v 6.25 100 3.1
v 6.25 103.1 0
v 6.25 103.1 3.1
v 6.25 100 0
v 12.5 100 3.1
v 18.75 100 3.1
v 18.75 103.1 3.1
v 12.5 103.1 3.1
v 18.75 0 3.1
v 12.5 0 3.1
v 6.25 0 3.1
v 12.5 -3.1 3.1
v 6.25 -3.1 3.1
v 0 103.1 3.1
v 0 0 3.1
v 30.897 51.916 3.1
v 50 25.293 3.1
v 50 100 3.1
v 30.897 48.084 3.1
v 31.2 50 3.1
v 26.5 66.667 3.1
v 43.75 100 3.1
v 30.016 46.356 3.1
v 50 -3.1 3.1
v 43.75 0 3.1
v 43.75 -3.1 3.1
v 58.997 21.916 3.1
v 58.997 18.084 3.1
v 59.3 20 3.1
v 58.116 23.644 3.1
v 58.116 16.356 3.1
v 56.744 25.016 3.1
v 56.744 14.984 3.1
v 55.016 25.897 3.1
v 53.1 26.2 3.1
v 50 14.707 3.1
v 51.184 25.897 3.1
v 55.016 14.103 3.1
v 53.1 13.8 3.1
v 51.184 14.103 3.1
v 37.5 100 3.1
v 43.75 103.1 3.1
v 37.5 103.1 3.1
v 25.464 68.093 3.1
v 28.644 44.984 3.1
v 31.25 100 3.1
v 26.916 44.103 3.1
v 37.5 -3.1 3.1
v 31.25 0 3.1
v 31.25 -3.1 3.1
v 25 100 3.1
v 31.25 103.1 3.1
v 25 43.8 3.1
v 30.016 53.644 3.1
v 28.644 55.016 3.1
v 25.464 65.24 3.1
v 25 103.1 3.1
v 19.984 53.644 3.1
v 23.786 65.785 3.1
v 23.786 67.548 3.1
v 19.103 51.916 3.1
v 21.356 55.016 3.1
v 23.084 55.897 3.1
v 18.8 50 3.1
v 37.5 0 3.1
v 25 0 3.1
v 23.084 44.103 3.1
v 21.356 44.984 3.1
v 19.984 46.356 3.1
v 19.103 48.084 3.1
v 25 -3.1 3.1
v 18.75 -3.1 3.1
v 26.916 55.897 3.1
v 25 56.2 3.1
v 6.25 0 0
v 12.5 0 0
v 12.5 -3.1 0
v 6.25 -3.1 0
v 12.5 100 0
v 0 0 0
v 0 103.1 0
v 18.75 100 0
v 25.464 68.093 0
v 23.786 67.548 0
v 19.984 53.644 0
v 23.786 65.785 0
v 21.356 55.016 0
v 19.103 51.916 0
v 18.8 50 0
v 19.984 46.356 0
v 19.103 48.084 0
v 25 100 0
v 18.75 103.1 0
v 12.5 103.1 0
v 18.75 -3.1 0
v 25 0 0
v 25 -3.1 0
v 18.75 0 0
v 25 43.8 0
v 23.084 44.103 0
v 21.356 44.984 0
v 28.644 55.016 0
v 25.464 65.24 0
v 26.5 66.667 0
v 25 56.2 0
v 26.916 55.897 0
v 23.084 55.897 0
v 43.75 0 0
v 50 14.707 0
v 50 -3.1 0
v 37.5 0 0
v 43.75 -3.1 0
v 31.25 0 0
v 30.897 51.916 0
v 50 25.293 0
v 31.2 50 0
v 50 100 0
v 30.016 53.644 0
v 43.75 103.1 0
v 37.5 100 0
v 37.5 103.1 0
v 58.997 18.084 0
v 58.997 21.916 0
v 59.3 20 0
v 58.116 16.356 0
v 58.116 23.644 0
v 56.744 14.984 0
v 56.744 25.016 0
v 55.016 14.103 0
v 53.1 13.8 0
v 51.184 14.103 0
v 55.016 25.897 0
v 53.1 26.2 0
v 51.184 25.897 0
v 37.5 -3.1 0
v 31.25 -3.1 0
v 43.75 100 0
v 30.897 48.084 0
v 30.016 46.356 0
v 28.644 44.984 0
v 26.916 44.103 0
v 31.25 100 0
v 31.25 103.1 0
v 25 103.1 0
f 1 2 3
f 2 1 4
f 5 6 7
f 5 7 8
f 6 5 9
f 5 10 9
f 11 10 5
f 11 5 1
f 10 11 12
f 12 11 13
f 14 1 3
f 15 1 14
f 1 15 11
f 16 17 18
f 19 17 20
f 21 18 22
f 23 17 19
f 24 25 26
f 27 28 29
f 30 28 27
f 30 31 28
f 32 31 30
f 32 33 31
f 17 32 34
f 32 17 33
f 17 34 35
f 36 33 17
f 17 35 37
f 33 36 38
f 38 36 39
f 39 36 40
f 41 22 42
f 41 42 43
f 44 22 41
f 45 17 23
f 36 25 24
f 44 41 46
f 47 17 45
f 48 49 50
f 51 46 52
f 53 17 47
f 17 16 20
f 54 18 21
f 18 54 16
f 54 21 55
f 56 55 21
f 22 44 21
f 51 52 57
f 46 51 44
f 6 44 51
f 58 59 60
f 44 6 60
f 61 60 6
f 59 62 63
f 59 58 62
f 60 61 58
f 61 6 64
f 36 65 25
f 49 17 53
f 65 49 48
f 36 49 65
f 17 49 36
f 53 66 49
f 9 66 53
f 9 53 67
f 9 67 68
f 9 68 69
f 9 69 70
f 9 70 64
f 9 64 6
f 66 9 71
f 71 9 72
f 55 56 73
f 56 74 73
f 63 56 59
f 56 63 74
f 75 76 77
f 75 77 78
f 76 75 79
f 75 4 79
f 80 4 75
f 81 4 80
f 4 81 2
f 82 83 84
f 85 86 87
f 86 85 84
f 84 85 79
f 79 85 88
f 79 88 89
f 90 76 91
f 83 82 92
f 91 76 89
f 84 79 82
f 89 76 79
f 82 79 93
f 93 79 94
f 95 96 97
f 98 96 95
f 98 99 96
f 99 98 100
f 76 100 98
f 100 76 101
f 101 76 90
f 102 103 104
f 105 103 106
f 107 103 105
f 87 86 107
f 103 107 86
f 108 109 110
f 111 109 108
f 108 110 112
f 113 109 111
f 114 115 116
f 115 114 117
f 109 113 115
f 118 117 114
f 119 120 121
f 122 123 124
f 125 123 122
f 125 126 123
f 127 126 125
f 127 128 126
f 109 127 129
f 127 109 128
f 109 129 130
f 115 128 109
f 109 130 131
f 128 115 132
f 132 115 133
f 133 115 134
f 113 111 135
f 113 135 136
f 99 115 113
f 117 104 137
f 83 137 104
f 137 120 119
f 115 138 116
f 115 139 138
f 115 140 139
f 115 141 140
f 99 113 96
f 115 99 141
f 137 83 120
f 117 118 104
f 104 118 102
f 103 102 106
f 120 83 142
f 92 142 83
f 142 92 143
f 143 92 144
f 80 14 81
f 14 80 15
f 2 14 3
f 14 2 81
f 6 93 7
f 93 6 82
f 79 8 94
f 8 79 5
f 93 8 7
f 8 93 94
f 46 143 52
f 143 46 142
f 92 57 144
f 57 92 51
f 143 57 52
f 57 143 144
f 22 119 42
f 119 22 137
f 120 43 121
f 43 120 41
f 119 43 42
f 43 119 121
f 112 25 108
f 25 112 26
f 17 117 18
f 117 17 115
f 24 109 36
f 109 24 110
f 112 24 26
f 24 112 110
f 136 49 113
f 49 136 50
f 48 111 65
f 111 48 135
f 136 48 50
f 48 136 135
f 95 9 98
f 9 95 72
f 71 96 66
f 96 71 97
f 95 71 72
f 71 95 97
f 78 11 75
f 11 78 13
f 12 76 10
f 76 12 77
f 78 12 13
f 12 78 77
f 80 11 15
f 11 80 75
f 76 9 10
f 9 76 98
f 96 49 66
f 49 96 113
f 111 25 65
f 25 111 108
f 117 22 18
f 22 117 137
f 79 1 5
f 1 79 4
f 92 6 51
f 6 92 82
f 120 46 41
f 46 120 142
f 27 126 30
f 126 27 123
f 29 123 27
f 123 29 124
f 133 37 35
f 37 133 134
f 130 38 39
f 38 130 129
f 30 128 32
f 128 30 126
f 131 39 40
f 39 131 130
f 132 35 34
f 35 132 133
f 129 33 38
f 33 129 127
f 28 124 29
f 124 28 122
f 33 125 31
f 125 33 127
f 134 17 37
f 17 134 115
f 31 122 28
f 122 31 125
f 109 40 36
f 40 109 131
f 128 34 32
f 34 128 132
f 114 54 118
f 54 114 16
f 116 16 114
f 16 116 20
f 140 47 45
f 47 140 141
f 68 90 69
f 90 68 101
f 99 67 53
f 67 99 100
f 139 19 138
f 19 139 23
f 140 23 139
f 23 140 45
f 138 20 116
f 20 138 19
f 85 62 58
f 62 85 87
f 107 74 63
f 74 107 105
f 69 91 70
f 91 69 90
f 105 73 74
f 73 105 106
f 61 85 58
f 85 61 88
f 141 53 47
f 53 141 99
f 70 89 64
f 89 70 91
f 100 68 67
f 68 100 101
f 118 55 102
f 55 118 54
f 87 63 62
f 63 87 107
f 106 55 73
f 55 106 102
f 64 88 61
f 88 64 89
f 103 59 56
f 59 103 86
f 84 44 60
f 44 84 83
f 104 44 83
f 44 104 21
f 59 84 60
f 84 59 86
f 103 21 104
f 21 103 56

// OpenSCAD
include <../lasercut.scad>; 

thickness = 3.1;
x = 50;
y = 100;
r = thickness*2;
lasercutoutSquare(thickness=thickness, x=x, y=y,
    finger_joints=[
            [UP, 1, 4],
            [DOWN, 1, 4]
        ],
    circles_add = [
            [r, x+thickness, y/5],
        ],
    circles_remove = [
            [r, x/2, y/2],
            [1.5, x/2, y*2/3], // Screw-hole
        ]
    );
    
